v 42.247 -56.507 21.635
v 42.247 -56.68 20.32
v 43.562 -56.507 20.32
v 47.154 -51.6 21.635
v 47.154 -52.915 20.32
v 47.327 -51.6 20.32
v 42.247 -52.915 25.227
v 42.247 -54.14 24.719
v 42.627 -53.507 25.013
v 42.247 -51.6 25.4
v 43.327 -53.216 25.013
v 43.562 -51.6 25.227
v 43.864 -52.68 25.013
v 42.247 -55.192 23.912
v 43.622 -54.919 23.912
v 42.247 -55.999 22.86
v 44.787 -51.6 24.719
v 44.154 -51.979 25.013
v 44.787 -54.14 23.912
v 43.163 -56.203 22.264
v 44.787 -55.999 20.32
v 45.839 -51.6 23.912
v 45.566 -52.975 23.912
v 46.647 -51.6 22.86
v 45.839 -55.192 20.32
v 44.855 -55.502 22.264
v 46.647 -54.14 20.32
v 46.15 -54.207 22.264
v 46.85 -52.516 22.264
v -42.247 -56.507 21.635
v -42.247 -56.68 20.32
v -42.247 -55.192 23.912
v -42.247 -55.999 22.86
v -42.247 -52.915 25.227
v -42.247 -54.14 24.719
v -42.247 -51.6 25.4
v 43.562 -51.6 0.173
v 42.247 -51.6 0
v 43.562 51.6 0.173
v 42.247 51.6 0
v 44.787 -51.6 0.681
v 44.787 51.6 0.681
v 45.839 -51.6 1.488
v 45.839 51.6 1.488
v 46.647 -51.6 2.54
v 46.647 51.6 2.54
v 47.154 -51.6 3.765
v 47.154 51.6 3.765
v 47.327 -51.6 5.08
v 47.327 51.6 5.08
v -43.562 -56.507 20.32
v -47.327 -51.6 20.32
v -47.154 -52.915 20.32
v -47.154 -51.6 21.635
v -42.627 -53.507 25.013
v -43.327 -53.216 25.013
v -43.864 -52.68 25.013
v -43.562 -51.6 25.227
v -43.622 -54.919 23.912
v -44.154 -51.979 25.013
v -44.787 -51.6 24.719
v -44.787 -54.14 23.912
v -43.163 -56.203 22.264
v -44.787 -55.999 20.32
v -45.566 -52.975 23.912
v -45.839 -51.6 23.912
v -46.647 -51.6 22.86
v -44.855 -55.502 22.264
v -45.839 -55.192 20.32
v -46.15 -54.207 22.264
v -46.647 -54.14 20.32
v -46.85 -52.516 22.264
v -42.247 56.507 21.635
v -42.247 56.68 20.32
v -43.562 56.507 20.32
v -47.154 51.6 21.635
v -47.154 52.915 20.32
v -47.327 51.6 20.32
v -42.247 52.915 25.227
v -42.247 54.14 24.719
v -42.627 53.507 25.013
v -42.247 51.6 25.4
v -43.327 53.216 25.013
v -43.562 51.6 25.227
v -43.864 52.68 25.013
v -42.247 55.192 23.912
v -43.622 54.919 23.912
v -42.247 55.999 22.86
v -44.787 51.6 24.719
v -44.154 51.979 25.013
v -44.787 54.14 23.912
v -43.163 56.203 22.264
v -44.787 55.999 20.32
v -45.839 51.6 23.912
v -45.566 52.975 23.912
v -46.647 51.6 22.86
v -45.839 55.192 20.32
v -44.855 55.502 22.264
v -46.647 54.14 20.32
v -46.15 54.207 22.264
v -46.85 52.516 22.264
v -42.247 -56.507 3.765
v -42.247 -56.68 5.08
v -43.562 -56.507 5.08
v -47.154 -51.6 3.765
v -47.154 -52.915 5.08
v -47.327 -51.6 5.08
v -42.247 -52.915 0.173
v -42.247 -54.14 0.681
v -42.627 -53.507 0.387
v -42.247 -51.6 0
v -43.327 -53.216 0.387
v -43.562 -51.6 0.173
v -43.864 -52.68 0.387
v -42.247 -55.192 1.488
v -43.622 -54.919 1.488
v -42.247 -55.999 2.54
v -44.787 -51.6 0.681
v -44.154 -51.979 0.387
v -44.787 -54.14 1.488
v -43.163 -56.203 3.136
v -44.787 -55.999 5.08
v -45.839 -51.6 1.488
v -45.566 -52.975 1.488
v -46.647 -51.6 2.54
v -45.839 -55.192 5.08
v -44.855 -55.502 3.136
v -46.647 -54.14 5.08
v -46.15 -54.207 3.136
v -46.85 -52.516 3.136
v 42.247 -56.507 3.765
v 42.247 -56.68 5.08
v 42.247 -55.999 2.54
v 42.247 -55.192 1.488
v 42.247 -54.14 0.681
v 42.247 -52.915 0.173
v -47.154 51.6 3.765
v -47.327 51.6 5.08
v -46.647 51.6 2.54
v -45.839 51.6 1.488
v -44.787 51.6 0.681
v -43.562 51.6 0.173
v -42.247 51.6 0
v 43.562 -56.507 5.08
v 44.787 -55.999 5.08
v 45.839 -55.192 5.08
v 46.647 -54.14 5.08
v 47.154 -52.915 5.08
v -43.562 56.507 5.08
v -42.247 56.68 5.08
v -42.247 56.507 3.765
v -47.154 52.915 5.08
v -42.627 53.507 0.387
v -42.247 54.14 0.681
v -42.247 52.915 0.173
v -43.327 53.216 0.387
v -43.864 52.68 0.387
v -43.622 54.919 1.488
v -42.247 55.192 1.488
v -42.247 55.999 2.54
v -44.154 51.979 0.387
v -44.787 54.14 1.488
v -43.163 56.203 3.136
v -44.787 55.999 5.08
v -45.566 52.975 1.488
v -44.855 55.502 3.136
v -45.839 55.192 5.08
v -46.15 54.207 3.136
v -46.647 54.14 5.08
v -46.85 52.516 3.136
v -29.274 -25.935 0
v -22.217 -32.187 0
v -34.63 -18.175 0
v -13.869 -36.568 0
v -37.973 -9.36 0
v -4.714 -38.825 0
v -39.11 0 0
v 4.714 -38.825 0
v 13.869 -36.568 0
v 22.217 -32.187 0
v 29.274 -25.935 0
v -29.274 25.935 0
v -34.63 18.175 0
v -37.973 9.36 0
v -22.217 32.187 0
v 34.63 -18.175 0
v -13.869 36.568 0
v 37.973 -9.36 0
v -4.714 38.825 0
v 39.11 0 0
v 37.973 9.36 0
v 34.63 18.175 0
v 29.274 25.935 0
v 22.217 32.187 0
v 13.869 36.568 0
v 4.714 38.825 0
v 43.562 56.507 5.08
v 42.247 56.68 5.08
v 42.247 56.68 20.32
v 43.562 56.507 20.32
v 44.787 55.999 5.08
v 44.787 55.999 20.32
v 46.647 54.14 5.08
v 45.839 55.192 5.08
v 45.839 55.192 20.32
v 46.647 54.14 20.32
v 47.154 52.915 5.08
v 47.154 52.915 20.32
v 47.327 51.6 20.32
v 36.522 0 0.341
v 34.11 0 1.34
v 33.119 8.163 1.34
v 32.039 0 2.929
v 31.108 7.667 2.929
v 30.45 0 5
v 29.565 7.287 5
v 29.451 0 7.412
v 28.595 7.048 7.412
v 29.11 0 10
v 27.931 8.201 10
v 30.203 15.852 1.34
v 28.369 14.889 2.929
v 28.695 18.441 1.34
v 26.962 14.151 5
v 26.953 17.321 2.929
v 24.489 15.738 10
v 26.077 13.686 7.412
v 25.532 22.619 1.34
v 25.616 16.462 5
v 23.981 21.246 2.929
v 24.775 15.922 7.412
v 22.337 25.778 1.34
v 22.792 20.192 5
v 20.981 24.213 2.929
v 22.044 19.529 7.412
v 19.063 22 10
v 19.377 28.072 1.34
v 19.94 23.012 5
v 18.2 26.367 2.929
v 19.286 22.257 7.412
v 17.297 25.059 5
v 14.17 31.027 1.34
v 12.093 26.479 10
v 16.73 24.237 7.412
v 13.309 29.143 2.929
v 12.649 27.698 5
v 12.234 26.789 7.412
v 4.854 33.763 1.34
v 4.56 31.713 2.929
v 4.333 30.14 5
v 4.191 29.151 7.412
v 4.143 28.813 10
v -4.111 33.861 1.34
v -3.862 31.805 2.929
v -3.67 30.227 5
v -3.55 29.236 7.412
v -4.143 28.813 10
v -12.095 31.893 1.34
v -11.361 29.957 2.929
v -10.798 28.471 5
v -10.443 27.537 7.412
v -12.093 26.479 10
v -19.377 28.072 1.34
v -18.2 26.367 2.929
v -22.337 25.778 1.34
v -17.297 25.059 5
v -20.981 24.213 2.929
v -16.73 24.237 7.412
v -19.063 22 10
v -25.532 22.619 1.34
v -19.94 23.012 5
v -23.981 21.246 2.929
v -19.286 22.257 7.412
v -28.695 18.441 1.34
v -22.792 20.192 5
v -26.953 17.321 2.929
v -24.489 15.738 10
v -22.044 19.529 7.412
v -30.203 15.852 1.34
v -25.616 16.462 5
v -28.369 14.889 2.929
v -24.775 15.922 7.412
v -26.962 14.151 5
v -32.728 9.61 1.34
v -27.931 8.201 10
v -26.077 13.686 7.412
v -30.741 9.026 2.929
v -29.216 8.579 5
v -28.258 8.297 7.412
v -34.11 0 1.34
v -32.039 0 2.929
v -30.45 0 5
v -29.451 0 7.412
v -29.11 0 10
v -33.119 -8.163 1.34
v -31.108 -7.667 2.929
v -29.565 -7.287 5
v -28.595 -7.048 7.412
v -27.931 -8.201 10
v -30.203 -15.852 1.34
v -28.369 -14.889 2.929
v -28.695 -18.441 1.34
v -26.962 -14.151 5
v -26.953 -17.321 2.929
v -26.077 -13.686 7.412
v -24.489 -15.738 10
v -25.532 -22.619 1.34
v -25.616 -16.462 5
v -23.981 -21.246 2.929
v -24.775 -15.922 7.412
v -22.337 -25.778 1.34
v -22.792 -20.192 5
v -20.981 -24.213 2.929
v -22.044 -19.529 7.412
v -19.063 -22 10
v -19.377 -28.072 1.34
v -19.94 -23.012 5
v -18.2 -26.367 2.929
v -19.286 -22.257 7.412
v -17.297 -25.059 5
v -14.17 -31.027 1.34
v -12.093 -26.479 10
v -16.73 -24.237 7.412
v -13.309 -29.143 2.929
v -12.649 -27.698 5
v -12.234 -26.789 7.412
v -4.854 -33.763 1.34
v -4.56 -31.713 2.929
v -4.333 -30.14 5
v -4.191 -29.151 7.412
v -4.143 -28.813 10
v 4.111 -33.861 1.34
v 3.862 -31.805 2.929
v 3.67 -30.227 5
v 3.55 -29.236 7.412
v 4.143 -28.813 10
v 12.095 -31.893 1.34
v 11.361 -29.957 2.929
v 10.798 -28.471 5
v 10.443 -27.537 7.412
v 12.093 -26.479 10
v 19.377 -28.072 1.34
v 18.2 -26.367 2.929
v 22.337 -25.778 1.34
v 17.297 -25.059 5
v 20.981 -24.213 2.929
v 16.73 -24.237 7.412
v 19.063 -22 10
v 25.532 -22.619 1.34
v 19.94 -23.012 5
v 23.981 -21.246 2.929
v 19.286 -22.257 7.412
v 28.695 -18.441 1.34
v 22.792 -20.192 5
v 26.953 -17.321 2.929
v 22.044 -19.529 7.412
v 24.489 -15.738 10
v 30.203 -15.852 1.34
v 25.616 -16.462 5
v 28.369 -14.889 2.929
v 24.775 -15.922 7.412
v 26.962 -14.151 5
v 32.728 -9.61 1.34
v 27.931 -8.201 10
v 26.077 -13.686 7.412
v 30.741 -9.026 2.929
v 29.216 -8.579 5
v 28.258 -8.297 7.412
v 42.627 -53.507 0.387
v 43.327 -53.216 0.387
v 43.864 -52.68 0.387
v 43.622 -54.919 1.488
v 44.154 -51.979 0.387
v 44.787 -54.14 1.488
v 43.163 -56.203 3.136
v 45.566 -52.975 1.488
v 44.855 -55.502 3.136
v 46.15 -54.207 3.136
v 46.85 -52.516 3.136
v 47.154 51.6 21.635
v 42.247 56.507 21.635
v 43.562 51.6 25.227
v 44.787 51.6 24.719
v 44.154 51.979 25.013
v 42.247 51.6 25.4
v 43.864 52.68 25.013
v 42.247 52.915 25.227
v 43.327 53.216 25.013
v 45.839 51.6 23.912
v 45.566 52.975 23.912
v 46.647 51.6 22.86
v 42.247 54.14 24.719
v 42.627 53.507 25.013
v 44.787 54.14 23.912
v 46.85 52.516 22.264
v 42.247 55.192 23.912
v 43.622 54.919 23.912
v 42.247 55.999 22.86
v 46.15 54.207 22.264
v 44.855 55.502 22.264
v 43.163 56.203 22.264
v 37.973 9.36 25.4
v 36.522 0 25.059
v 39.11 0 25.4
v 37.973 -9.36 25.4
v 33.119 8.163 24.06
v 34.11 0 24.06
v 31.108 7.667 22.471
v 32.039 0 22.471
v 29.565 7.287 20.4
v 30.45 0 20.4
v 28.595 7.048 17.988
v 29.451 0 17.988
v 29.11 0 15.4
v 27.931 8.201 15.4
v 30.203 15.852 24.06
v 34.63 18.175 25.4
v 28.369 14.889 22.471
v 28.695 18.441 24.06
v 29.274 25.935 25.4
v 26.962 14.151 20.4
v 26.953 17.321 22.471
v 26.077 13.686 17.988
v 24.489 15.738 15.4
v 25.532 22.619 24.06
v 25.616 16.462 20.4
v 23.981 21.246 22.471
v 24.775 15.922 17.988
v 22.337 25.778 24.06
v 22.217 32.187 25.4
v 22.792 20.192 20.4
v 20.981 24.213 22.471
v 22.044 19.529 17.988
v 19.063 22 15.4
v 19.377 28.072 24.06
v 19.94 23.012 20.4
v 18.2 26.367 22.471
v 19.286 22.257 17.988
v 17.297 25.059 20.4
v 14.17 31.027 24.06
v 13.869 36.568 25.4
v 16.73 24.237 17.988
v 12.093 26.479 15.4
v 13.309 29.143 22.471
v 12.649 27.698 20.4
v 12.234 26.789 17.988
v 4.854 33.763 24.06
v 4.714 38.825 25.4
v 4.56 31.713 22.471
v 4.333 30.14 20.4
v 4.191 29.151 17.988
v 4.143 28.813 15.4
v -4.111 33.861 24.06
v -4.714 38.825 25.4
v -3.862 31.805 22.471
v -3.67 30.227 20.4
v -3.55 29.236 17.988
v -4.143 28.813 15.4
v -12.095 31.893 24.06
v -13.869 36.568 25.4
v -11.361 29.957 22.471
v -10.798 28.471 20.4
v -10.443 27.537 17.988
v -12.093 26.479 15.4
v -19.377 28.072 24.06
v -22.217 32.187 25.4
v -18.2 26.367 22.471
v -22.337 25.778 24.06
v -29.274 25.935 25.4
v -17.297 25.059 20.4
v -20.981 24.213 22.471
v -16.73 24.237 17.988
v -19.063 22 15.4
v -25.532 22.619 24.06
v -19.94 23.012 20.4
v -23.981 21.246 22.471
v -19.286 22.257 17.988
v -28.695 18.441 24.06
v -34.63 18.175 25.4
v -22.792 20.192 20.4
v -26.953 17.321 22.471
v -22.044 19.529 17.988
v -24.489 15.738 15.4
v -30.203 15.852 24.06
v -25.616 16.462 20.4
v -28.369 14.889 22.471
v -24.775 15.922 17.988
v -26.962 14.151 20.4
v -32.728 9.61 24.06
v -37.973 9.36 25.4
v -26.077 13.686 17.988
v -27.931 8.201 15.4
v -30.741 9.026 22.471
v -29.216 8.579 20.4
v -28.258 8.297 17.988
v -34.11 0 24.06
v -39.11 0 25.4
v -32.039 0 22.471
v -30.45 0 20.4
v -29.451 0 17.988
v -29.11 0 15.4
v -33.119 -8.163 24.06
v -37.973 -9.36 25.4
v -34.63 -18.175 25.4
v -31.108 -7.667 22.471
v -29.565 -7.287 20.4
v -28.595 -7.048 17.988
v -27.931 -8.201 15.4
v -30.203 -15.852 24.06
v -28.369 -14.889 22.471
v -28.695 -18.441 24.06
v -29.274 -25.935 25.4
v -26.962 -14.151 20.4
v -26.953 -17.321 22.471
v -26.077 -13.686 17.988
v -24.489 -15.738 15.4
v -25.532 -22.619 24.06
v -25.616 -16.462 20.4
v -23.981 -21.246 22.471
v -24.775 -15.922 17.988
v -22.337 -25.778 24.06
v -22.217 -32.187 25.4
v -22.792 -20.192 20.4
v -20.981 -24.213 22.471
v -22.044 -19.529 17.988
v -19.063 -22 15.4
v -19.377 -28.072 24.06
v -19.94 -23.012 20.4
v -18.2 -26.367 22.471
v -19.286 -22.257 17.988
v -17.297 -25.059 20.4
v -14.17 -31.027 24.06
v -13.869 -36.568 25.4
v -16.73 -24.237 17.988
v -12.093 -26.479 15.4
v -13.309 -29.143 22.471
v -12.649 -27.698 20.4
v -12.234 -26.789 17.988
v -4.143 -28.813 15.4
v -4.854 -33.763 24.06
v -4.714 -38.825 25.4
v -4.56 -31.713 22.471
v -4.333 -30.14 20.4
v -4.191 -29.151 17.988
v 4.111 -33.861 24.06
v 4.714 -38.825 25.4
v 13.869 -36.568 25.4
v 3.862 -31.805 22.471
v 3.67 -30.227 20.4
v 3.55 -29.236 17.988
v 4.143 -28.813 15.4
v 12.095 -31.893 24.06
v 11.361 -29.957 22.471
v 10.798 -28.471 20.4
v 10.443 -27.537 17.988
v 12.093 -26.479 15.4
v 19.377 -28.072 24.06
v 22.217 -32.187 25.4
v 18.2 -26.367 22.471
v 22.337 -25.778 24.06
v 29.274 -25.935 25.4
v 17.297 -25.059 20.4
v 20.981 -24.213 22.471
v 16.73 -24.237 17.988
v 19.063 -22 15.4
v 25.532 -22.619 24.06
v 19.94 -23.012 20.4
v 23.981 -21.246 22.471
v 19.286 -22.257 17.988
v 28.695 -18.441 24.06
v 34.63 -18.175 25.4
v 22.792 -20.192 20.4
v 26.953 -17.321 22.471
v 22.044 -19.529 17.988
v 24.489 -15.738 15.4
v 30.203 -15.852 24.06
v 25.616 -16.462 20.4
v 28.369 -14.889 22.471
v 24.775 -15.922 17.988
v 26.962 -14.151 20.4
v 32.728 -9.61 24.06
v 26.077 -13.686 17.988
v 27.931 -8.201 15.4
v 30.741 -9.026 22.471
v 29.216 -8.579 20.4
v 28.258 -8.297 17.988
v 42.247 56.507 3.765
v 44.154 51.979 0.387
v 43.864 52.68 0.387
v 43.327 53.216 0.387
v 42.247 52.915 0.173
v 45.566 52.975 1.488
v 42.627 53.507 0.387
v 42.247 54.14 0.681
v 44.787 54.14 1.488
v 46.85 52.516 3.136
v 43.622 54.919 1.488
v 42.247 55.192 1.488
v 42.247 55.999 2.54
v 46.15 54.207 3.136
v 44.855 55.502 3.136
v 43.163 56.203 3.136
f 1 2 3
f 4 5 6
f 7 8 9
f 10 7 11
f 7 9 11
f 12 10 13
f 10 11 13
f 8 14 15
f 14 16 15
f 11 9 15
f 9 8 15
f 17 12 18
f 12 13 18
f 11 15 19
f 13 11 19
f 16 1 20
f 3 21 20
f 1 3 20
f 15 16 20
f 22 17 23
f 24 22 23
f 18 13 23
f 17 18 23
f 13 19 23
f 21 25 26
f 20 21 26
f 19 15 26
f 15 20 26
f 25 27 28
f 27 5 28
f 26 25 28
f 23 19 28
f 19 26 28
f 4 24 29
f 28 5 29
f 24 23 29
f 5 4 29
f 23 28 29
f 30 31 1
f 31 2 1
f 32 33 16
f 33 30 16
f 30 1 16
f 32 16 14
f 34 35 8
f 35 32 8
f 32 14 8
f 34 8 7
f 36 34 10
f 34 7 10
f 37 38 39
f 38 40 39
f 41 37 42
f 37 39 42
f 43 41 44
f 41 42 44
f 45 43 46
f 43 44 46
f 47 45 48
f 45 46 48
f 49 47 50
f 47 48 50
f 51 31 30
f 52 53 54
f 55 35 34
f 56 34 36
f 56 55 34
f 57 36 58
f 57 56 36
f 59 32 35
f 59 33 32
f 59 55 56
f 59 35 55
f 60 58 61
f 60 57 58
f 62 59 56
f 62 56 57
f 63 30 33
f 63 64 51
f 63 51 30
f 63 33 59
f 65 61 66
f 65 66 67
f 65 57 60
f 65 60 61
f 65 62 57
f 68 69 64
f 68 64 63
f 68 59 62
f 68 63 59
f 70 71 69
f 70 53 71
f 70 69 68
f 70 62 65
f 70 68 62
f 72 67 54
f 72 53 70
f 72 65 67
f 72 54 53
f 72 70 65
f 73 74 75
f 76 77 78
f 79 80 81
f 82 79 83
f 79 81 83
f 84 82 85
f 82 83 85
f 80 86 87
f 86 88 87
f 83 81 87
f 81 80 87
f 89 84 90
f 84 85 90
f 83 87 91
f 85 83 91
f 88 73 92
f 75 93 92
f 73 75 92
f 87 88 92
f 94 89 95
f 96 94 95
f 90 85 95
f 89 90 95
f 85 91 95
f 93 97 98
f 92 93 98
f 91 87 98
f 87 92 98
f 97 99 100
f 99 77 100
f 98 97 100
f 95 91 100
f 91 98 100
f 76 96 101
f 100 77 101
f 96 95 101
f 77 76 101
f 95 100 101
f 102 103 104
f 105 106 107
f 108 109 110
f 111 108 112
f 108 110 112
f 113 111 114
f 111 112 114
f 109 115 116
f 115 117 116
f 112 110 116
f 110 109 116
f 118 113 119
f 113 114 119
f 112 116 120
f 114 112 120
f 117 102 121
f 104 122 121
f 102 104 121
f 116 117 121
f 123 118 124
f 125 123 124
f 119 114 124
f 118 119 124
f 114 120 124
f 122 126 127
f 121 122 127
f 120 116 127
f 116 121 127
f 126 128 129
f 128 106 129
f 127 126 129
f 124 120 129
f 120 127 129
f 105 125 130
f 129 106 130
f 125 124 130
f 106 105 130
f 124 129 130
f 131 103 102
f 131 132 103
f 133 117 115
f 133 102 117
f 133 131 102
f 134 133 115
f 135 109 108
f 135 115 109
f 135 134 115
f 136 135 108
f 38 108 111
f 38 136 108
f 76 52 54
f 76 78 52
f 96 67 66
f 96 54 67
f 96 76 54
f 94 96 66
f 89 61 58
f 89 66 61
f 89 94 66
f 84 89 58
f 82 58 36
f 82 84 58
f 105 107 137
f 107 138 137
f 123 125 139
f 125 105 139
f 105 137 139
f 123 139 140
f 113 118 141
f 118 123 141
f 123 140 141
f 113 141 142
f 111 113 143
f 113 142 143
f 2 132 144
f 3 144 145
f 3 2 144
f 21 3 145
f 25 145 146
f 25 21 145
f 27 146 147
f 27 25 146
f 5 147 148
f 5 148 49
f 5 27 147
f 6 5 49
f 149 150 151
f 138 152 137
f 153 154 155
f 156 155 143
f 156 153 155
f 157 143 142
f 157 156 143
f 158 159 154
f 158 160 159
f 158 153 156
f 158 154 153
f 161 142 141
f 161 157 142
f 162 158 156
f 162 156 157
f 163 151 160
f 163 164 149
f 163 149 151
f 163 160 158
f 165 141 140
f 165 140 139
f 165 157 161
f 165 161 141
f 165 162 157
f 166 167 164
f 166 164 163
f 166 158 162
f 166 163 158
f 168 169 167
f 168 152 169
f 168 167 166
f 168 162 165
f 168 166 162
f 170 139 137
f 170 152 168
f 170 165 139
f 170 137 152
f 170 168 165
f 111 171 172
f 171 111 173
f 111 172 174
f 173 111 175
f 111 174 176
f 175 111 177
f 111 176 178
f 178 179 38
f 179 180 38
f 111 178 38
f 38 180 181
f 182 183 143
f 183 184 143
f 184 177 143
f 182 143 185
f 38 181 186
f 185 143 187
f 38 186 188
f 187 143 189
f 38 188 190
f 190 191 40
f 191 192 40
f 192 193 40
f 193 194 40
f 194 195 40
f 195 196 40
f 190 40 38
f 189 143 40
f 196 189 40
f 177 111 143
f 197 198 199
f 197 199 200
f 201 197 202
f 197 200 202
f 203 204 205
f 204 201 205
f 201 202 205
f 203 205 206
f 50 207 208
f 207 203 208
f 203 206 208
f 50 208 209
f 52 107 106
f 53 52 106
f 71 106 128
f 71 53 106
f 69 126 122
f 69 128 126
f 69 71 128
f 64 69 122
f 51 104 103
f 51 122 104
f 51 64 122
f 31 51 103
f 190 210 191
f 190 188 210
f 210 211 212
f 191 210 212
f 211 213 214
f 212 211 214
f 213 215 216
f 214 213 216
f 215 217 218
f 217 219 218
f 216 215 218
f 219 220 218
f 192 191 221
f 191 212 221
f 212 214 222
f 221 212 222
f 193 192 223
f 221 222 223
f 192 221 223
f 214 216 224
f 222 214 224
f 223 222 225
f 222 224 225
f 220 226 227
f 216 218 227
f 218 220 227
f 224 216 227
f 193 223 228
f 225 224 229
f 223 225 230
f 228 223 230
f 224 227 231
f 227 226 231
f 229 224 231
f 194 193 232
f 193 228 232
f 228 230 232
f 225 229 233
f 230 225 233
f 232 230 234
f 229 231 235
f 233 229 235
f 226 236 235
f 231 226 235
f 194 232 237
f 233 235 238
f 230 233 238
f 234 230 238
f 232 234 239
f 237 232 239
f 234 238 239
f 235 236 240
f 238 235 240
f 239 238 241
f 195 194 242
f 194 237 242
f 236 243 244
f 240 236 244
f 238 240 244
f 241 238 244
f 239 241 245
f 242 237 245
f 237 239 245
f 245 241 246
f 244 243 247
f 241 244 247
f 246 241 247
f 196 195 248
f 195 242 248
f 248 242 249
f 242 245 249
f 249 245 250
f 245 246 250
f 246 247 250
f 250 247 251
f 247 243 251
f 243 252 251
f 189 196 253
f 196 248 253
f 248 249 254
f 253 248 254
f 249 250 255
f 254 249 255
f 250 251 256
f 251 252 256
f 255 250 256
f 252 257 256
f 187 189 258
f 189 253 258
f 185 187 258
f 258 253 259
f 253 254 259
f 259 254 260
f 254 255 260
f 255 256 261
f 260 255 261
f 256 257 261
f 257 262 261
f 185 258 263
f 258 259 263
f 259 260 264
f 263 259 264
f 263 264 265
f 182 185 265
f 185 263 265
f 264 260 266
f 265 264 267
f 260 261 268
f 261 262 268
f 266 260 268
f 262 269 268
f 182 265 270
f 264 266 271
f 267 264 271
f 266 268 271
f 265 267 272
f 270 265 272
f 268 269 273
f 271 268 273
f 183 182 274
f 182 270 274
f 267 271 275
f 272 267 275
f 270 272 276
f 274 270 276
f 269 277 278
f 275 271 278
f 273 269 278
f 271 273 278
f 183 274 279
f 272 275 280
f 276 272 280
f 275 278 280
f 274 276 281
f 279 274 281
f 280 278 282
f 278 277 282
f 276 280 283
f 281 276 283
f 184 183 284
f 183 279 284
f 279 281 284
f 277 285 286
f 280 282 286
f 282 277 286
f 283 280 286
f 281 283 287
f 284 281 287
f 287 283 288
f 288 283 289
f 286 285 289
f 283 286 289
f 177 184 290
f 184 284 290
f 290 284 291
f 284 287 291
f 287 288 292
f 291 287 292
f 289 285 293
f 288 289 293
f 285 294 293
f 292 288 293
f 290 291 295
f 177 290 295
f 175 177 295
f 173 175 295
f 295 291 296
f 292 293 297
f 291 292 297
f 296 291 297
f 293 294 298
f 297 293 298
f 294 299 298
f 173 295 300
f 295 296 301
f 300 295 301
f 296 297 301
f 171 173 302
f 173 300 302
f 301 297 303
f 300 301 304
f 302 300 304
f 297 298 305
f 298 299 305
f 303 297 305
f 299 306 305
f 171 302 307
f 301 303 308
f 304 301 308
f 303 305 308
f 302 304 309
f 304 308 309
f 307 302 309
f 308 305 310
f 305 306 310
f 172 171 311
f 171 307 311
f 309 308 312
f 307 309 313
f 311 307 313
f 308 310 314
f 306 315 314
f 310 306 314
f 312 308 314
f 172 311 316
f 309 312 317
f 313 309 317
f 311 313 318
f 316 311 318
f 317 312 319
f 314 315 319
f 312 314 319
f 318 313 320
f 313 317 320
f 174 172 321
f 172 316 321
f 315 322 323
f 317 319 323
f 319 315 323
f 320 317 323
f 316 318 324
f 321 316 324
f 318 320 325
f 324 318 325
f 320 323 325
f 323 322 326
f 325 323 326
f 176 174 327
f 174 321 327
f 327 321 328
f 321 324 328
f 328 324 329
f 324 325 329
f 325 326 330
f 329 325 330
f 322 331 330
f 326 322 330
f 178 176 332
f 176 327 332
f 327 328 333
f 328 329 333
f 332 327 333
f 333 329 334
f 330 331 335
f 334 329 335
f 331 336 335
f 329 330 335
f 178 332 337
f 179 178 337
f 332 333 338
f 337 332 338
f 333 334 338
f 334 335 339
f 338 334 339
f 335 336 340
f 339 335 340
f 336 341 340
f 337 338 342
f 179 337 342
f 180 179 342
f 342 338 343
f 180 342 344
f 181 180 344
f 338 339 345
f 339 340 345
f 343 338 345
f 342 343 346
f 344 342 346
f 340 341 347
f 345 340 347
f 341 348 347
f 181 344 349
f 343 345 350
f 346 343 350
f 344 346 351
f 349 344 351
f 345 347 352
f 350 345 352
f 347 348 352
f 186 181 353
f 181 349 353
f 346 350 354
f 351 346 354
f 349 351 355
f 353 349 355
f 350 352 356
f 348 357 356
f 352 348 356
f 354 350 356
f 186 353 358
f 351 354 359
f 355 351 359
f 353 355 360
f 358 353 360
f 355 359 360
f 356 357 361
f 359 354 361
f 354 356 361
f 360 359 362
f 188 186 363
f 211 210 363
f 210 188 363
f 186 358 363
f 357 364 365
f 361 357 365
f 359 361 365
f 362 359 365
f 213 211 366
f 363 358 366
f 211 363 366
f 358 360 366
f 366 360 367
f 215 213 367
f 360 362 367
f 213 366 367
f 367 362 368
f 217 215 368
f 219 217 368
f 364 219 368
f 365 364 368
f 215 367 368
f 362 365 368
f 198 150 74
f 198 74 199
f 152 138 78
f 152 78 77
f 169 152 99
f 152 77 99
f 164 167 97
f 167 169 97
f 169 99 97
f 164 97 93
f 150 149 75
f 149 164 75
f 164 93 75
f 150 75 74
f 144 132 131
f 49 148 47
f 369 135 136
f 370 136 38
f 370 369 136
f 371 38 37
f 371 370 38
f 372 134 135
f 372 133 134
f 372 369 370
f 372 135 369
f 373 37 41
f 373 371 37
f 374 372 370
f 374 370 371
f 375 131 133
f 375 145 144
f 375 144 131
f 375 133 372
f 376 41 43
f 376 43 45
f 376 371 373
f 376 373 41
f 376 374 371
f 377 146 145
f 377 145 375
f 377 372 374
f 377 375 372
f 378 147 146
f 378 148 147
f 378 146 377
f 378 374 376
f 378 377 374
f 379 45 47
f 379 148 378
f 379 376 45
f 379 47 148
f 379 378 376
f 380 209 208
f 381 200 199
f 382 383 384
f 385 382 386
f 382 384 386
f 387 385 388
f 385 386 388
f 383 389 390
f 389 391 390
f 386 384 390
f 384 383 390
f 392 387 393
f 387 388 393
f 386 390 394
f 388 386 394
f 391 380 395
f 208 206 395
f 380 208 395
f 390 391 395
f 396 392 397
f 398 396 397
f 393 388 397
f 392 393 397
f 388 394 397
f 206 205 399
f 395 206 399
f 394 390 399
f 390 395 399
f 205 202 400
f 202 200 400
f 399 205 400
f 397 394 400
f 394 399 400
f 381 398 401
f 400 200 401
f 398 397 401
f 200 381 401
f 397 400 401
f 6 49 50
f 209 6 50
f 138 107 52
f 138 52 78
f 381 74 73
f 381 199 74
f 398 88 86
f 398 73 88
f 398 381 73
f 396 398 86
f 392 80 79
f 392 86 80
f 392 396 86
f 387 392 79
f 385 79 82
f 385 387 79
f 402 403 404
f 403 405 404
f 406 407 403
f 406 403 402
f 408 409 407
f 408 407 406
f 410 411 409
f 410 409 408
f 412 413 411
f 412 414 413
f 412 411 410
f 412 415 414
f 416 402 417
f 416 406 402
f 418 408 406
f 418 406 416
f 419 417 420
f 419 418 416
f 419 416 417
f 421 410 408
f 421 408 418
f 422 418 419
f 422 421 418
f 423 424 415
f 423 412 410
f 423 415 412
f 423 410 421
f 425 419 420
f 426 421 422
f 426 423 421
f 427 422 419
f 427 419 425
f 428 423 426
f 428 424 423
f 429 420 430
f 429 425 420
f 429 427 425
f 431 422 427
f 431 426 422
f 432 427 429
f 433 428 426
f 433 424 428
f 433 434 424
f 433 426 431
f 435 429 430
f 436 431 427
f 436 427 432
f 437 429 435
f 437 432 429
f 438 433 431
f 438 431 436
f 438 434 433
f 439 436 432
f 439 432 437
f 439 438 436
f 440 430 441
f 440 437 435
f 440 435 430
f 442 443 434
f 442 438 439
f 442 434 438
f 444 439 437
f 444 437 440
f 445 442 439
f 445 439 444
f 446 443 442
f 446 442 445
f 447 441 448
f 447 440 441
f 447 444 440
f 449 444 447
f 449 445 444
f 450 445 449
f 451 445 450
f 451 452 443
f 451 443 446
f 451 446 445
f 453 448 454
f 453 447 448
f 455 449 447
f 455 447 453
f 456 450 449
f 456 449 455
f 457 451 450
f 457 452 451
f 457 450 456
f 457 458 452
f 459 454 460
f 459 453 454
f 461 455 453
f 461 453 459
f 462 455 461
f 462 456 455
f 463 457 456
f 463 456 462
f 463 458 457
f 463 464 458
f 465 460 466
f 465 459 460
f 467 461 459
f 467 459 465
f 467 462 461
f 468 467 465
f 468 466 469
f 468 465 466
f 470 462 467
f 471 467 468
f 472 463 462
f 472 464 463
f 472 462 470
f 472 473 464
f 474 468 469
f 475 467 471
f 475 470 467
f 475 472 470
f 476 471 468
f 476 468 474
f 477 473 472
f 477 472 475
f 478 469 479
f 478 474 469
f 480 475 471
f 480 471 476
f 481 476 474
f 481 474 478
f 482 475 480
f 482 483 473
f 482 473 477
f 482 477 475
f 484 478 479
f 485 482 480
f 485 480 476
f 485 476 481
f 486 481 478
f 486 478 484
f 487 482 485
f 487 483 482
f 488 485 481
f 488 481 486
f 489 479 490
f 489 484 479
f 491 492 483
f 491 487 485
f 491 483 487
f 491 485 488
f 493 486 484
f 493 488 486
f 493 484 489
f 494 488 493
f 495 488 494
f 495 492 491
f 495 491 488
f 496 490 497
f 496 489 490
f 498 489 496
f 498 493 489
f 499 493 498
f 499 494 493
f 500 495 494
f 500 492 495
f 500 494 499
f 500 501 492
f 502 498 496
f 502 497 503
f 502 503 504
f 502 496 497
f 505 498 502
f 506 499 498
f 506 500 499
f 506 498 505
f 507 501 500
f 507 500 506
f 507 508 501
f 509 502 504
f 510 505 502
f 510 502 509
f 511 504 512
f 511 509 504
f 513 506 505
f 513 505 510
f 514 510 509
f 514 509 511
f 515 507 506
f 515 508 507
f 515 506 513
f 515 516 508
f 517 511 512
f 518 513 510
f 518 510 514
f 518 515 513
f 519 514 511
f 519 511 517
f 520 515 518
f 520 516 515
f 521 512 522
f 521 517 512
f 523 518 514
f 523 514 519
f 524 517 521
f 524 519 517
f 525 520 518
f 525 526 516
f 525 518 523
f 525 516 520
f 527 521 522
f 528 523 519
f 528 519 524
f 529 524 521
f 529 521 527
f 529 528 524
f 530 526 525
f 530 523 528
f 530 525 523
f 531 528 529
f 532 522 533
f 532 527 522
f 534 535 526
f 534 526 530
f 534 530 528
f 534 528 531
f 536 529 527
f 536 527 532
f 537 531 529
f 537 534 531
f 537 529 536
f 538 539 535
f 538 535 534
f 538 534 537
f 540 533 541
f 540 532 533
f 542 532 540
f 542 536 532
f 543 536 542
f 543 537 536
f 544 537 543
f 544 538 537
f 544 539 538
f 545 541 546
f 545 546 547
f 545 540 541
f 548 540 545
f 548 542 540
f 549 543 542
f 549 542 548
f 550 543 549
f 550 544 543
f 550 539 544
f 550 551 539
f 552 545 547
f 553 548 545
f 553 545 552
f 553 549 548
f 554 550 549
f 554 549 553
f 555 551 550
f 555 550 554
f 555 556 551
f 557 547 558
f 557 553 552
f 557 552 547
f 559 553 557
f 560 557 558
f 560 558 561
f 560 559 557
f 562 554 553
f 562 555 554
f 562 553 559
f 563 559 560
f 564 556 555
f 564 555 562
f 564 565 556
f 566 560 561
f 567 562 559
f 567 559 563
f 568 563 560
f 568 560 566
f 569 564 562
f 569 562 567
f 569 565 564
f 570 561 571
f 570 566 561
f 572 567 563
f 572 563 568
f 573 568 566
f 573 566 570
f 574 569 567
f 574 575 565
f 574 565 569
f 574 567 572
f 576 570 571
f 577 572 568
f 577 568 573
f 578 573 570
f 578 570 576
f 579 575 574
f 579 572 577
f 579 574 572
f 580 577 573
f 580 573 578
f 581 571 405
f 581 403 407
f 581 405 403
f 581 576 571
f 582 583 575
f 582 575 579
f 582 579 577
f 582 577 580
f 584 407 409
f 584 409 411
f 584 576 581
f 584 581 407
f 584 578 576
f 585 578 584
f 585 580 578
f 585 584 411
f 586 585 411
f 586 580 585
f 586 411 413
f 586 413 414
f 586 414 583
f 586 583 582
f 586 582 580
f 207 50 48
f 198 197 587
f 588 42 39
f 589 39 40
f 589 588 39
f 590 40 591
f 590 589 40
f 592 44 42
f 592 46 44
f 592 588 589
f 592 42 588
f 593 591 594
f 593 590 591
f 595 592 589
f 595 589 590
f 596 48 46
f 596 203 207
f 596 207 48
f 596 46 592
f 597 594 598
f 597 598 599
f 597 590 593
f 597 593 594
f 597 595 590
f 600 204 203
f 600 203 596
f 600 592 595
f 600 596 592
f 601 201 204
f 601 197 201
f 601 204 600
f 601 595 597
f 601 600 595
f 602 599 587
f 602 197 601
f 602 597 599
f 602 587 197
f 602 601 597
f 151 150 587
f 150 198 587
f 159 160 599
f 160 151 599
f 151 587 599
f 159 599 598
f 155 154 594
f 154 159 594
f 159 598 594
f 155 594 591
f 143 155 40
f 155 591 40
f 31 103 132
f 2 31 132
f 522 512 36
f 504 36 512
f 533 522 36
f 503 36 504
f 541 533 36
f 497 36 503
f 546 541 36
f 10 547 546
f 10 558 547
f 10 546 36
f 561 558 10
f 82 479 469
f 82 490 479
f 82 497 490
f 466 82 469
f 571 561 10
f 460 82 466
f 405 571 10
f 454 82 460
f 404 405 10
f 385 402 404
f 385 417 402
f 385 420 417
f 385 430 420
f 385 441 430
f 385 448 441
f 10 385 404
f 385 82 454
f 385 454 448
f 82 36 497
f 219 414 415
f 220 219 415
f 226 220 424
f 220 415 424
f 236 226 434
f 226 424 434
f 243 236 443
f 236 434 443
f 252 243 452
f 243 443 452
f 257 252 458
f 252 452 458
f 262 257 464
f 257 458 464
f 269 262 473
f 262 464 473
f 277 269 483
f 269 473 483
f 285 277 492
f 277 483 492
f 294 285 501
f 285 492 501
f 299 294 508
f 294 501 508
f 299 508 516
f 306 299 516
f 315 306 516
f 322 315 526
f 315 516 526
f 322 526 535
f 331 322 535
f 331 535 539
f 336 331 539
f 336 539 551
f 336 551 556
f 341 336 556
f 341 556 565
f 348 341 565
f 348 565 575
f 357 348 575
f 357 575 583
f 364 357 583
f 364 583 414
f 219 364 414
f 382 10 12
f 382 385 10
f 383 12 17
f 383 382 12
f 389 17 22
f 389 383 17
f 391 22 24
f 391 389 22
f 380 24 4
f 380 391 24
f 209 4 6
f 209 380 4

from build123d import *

# Parameters (mm, degrees)
F0_W     = 94.654716
F0_H     = 113.359868
F1_DEPTH = 25.4
F2_R     = 29.109761
F3_DEPTH = 25.401
F4_R     = 5.08
F5_R     = 10


with BuildPart() as f1:
    # F0 (on Top) → F1 (new body)
    with BuildSketch(Plane.XY):
        Rectangle(F0_W, F0_H)
    extrude(amount=F1_DEPTH)

    # F2 (on face) → F3 (cut, through all)
    with BuildSketch(Plane.XY.offset(25.4)):
        Circle(F2_R)
    extrude(amount=-F3_DEPTH, mode=Mode.SUBTRACT)

    # F4
    f4_edges = [f1.edges().sort_by_distance(p)[0] for p in [
        (-47.327358, -56.679934, 12.7),
        (47.327358, -56.679934, 12.7),
        (0, -56.679934, 0),
        (0, -56.679934, 25.4),
        (47.327358, 56.679934, 12.7),
        (47.327358, 0, 0),
        (47.327358, 0, 25.4),
        (-47.327358, 56.679934, 12.7),
        (0, 56.679934, 0),
        (0, 56.679934, 25.4),
        (-47.327358, 0, 0),
        (-47.327358, 0, 25.4),
    ]]
    fillet(f4_edges, radius=F4_R)

    # F5
    f5_edges = [f1.edges().sort_by_distance(p)[0] for p in [
        (-29.109761, 0, 25.4),
        (29.109761, 0, 12.7),
        (-29.109761, 0, 0),
    ]]
    fillet(f5_edges, radius=F5_R)


solid = f1.part
